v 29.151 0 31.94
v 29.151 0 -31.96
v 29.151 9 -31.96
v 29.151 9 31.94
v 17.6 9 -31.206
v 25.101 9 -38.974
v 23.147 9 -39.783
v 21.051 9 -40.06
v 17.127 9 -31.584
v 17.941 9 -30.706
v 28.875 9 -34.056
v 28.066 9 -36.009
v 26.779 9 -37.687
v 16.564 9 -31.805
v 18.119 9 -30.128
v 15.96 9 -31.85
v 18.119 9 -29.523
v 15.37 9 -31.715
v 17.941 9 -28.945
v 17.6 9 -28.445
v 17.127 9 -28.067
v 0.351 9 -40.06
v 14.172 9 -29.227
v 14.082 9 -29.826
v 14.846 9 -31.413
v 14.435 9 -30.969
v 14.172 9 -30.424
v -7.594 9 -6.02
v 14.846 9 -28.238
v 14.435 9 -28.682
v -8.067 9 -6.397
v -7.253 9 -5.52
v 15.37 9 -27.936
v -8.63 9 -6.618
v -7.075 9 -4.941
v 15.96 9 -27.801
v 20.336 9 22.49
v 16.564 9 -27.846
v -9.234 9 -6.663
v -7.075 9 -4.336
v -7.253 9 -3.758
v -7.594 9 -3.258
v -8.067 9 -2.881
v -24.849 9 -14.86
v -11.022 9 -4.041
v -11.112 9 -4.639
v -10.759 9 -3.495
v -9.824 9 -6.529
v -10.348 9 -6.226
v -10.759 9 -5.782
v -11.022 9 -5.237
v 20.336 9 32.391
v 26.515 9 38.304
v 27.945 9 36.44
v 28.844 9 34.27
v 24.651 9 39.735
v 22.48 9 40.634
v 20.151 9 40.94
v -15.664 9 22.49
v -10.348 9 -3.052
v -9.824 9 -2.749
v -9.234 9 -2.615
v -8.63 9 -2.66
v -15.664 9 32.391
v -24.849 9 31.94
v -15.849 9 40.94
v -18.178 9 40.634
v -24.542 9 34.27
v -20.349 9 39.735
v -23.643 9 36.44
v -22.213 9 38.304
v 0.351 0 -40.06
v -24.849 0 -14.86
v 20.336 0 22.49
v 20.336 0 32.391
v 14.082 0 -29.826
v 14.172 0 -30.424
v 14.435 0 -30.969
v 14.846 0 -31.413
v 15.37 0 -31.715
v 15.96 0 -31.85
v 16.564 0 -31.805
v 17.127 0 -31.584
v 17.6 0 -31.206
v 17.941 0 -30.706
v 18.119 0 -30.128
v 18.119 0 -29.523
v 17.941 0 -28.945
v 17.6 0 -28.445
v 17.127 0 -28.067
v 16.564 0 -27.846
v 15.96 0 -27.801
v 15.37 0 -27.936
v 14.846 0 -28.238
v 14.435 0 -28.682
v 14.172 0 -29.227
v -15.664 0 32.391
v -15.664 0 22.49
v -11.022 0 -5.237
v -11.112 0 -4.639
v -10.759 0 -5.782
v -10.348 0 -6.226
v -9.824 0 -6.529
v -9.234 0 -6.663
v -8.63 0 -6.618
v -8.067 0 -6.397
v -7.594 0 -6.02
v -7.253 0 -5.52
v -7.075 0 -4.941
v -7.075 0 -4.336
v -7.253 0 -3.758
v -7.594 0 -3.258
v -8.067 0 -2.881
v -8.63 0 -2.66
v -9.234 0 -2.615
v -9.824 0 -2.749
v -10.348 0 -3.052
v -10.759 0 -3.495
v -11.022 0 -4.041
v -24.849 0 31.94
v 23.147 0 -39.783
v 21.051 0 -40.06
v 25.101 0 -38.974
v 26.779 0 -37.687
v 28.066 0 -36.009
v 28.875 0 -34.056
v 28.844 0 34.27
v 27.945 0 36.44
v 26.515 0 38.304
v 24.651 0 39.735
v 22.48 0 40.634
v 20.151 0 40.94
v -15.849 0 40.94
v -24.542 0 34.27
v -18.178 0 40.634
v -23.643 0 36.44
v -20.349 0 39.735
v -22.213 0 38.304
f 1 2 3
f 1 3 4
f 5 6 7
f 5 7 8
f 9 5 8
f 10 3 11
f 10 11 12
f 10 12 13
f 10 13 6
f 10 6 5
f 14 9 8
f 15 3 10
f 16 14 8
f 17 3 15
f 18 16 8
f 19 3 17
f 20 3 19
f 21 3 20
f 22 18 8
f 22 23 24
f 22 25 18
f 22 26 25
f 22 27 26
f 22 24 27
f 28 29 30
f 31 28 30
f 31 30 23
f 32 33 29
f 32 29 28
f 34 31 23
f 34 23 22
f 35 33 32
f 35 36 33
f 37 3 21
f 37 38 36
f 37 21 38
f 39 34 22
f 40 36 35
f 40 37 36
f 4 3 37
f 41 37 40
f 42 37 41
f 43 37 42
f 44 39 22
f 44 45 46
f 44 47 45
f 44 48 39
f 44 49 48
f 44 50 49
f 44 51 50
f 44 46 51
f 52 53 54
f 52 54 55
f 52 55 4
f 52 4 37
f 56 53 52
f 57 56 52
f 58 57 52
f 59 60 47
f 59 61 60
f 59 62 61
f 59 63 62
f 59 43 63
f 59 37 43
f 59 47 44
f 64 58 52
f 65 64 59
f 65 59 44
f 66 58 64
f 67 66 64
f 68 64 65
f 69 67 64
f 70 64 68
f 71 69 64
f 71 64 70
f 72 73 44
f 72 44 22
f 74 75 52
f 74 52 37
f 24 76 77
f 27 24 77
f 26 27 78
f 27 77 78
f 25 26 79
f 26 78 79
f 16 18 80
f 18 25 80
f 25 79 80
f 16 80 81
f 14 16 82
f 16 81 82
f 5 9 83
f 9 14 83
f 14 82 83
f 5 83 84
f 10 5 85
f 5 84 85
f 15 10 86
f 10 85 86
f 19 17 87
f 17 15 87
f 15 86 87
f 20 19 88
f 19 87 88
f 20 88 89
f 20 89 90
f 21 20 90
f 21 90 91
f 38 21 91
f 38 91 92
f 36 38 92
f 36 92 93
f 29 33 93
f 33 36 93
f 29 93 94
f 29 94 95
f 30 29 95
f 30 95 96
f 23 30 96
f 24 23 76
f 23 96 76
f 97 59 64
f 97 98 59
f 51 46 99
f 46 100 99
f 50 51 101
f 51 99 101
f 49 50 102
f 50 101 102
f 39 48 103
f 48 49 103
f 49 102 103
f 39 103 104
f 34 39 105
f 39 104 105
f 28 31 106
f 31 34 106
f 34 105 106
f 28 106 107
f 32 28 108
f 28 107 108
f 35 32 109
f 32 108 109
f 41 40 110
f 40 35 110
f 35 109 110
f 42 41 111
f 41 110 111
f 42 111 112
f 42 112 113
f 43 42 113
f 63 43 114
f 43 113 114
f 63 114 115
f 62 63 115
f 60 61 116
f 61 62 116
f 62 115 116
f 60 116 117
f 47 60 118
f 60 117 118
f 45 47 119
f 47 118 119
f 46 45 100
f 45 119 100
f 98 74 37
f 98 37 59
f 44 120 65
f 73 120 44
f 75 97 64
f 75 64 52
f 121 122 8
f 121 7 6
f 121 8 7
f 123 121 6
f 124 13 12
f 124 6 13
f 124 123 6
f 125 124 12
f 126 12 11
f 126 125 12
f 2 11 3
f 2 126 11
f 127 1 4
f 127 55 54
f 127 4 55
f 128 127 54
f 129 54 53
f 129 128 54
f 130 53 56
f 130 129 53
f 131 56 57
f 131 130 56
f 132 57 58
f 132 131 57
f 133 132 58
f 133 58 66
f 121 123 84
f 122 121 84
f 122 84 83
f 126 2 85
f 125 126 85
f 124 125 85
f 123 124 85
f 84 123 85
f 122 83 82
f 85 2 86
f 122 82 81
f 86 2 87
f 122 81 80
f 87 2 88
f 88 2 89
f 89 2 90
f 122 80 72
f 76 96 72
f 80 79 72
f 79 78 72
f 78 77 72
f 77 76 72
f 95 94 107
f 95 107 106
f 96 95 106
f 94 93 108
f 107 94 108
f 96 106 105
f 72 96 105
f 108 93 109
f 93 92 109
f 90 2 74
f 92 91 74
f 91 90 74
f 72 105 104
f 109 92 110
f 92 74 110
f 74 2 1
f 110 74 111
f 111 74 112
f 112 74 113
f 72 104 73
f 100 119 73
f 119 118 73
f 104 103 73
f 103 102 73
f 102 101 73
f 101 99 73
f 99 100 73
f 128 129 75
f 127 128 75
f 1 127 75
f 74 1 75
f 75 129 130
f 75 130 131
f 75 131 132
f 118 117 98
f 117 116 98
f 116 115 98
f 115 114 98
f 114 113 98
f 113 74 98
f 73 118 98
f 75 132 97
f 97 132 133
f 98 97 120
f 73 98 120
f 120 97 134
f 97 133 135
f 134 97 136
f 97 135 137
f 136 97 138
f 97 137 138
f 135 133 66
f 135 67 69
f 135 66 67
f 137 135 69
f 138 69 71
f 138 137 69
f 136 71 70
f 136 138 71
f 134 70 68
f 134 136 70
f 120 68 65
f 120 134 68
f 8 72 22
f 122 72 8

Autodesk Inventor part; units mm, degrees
ref_plane "YZ Plane" through (0, 0, 0) normal (1, 0, 0) x (0, 1, 0)
ref_plane "XZ Plane" through (0, 0, 0) normal (0, 1, 0) x (-1, 0, 0)
ref_plane "XY Plane" through (0, 0, 0) normal (0, 0, 1) x (1, 0, 0)
sketch "Sketch1" plane through (0, 0, 0) normal (0, 1, 0) x (-1, 0, 0)
  line L0 (-20.151, 40.9405) -> (15.849, 40.9405)
  line L1 (24.849, 31.9405) -> (24.849, -14.8595)
  line L2 (-0.351, -40.0595) -> (-21.051, -40.0595)
  line L3 (-29.151, -31.9595) -> (-29.151, 31.9405)
  arc A0 (24.849, 31.9405) -> (15.849, 40.9405) centre (15.849, 31.9405) ccw
  arc A1 (-20.151, 40.9405) -> (-29.151, 31.9405) centre (-20.151, 31.9405) ccw
  arc A2 (-29.151, -31.9595) -> (-21.051, -40.0595) centre (-21.051, -31.9595) ccw
  line L4 (24.849, -14.8595) -> (-0.351, -40.0595)
  circle A3 centre (9.082, -4.6389) radius 2.03
  circle A4 centre (-16.112, -29.8255) radius 2.03
  line L5 (15.664, 32.3905) -> (-20.336, 32.3905)
  line L6 (-20.336, 32.3905) -> (-20.336, 22.4905)
  line L7 (-20.336, 22.4905) -> (15.664, 22.4905)
  line L8 (15.664, 22.4905) -> (15.664, 32.3905)
  point P0 (0, 0)
  point P1 (-29.151, 40.9405)
  point P2 (24.849, -40.0595)
  point P3 (24.849, 40.9405)
  point P4 (-29.151, -40.0595)
  dimension "d0" = 9
  dimension "d1" = 8.1
  dimension "d2" = 20.7
  dimension "d3" = 36
  dimension "d4" = 46.8
  dimension "d5" = 9
  dimension "d6" = 63.9
  dimension "d7" = 4.06
  dimension "d8" = 4.06
  dimension "d9" = 15.767
  dimension "d10" = 18.376
  dimension "d11" = 10.234
  dimension "d12" = 13.039
  dimension "d13" = 38.233
  dimension "d14" = 9.9
  dimension "d15" = 36
  dimension "d16" = 8.55
  dimension "d17" = 8.815
  dimension "d18" = 9.185
extrude "Extrusion1" add sketch "Sketch1" along normal blind 9
properties part number "hip hitam"
